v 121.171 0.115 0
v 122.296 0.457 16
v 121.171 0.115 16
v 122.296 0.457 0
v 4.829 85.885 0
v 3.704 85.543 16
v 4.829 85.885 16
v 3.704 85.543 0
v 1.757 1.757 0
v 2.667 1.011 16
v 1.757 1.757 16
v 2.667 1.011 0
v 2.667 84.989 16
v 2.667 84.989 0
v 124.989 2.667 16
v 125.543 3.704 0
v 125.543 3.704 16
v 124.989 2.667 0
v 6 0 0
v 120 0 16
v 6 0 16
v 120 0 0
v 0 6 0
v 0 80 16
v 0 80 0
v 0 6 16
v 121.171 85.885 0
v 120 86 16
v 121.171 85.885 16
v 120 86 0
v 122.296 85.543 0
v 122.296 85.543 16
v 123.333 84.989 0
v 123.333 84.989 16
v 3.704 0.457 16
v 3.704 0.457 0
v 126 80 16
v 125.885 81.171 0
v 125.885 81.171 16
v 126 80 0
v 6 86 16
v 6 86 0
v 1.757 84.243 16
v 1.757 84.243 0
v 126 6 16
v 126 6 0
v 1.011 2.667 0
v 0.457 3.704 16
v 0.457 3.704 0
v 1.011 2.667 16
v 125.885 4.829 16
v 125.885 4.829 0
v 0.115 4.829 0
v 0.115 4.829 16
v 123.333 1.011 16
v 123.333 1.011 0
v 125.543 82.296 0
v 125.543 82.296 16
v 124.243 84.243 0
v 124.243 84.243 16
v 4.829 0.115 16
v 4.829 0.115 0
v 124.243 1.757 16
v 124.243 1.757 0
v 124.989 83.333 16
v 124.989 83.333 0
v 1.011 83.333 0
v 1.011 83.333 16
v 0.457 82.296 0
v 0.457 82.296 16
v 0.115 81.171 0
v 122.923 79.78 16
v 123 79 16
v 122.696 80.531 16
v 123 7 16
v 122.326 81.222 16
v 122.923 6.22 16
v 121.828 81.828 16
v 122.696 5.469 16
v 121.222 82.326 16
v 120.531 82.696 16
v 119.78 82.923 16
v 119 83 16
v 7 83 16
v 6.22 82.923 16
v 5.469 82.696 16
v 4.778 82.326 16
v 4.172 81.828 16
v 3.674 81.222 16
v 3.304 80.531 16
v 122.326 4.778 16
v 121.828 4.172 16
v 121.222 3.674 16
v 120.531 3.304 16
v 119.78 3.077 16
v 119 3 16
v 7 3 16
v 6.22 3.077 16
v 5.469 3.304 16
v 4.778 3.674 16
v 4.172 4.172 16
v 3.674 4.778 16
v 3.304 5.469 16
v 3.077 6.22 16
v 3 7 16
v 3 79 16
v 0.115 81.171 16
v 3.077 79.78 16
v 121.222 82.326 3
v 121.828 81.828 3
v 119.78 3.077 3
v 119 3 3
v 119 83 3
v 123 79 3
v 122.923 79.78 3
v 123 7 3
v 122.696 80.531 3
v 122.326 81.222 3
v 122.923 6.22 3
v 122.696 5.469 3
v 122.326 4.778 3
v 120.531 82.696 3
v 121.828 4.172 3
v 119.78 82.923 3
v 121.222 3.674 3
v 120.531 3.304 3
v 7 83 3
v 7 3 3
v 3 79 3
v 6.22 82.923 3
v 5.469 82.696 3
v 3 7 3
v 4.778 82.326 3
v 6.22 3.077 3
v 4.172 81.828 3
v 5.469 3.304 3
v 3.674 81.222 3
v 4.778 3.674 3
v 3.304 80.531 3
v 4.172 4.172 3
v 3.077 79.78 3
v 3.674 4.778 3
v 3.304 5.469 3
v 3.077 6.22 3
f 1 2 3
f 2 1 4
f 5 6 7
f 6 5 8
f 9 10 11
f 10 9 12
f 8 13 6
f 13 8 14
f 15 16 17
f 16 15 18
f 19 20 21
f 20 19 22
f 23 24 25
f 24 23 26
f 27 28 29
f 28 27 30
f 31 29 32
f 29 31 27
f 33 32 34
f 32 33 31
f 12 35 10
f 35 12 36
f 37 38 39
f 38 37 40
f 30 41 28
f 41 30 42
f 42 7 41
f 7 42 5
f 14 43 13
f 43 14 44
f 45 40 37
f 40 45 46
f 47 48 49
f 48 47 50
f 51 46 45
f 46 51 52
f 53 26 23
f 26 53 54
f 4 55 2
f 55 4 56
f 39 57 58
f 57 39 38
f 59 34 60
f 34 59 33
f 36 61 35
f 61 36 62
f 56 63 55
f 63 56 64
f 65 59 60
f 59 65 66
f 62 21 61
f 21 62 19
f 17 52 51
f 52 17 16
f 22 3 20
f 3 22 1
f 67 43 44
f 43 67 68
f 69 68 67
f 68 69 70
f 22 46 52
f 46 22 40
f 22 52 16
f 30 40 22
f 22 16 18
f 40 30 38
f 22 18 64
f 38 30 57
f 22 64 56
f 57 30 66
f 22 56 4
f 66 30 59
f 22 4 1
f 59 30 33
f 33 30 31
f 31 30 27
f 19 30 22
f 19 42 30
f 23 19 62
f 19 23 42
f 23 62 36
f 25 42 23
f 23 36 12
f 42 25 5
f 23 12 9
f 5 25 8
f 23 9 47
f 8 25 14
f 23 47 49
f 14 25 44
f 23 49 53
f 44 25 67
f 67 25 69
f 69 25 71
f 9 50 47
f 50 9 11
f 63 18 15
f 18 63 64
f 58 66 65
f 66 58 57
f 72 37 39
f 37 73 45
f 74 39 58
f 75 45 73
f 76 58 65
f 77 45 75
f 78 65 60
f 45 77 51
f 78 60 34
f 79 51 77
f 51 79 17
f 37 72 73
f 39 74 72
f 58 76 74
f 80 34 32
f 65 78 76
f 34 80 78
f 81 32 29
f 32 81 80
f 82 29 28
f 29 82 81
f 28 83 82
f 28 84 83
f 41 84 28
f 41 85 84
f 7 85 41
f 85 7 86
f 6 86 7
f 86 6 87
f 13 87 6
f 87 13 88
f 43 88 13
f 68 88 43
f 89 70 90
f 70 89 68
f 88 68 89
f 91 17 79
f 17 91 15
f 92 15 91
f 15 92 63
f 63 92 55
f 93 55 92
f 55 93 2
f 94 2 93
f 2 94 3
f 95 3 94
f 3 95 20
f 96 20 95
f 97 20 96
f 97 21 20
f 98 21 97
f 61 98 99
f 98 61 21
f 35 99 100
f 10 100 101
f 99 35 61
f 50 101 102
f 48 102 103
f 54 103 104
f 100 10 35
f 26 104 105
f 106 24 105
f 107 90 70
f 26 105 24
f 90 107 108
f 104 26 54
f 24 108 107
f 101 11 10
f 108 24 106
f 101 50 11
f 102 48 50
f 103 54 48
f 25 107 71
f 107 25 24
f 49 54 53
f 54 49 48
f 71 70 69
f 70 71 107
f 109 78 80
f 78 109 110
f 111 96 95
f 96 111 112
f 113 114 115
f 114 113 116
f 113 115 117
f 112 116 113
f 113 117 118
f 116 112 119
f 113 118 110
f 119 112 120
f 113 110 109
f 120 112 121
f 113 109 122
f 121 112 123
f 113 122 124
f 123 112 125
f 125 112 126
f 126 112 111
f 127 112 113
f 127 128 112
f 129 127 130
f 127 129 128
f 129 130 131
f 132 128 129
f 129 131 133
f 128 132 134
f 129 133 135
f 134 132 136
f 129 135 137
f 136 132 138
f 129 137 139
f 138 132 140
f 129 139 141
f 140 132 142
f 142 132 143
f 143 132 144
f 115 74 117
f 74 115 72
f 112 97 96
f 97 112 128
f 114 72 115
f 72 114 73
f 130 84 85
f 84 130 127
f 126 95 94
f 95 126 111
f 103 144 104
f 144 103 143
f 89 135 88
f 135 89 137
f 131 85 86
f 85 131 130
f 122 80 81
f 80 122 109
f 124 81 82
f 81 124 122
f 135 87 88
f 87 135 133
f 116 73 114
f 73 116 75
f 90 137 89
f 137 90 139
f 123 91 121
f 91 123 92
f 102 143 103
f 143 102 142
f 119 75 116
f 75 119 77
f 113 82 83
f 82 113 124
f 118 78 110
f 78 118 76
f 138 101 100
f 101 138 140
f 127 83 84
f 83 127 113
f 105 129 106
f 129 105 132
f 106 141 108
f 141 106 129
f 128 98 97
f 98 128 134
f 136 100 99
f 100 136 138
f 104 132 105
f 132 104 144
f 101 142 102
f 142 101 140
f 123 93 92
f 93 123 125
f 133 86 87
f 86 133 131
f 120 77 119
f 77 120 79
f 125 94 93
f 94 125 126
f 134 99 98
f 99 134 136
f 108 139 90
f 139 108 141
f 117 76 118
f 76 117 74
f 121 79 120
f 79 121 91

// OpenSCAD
full_length=120;
full_width=80;
height=5;
thickness=3;
inner_radius=4;
outer_radius=6;

module rounded_box(length, width, height, radius) {
    r2 = radius*2;
    translate([radius, radius, 0]) minkowski($fn=32) {
        cube([length-r2, width-r2, height]);
        cylinder(h=height, r=radius);
    };
}

difference() {
    t2=thickness*2;
    rounded_box(full_length+t2, full_width+t2, height+thickness, outer_radius);
    # translate([thickness, thickness, thickness])
      rounded_box(full_length, full_width, height+2.0, inner_radius);
}
